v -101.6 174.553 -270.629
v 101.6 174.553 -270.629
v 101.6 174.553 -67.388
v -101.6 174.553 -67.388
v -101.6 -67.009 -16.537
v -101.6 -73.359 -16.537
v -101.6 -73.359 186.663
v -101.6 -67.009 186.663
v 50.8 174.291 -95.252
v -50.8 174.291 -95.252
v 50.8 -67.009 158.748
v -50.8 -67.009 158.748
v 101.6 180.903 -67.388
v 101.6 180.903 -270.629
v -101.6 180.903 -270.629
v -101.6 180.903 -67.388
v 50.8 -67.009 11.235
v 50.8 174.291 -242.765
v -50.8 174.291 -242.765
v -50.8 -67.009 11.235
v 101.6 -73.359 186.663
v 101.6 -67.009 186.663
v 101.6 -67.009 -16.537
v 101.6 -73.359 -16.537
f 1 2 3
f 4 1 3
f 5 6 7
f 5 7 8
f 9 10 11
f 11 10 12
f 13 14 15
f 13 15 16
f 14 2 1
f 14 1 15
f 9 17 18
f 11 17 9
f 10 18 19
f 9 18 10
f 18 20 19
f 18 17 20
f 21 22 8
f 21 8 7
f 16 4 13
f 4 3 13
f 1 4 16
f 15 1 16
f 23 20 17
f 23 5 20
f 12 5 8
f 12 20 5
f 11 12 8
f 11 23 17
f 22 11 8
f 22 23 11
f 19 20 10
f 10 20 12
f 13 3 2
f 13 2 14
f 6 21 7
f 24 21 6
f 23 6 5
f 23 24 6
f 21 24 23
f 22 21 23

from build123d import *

# Parameters (mm, degrees)
F1_DEPTH      = 101.6
F1_DEPTH_BACK = 101.6
F2_DEPTH      = 50.8
F2_DEPTH_BACK = 50.8
F0_W          = 6.35
F0_H          = 203.241327
F3_DEPTH      = 101.6
F3_DEPTH_BACK = 101.6


with BuildPart() as f1:
    # F0 (on Right) → F1 (new body, two sides)
    with BuildSketch(Plane.YZ) as f1_sk:
        Polygon((-73.359335, -16.53693), (-67.009335, -16.53693), (-67.009335, 11.234743), (-67.009335, 158.74847), (-67.009335, 186.66307), (-73.359335, 186.66307), align=None)
    extrude(amount=F1_DEPTH)
    extrude(f1_sk.sketch, amount=-F1_DEPTH_BACK)

    # F0 (on Right) → F2 (join, two sides)
    with BuildSketch(Plane.YZ) as f2_sk:
        Polygon((-67.009335, 158.74847), (-67.009335, 11.234743), (174.290665, -242.765257), (174.290665, -95.25153), align=None)
    extrude(amount=F2_DEPTH)
    extrude(f2_sk.sketch, amount=-F2_DEPTH_BACK)


with BuildPart() as f3:
    # F0 (on Right) → F3 (new body, two sides)
    with BuildSketch(Plane.YZ) as f3_sk:
        with Locations((177.728186, -169.008393)):
            Rectangle(F0_W, F0_H)
    extrude(amount=F3_DEPTH)
    extrude(f3_sk.sketch, amount=-F3_DEPTH_BACK)


solid = Compound([f1.part, f3.part])
